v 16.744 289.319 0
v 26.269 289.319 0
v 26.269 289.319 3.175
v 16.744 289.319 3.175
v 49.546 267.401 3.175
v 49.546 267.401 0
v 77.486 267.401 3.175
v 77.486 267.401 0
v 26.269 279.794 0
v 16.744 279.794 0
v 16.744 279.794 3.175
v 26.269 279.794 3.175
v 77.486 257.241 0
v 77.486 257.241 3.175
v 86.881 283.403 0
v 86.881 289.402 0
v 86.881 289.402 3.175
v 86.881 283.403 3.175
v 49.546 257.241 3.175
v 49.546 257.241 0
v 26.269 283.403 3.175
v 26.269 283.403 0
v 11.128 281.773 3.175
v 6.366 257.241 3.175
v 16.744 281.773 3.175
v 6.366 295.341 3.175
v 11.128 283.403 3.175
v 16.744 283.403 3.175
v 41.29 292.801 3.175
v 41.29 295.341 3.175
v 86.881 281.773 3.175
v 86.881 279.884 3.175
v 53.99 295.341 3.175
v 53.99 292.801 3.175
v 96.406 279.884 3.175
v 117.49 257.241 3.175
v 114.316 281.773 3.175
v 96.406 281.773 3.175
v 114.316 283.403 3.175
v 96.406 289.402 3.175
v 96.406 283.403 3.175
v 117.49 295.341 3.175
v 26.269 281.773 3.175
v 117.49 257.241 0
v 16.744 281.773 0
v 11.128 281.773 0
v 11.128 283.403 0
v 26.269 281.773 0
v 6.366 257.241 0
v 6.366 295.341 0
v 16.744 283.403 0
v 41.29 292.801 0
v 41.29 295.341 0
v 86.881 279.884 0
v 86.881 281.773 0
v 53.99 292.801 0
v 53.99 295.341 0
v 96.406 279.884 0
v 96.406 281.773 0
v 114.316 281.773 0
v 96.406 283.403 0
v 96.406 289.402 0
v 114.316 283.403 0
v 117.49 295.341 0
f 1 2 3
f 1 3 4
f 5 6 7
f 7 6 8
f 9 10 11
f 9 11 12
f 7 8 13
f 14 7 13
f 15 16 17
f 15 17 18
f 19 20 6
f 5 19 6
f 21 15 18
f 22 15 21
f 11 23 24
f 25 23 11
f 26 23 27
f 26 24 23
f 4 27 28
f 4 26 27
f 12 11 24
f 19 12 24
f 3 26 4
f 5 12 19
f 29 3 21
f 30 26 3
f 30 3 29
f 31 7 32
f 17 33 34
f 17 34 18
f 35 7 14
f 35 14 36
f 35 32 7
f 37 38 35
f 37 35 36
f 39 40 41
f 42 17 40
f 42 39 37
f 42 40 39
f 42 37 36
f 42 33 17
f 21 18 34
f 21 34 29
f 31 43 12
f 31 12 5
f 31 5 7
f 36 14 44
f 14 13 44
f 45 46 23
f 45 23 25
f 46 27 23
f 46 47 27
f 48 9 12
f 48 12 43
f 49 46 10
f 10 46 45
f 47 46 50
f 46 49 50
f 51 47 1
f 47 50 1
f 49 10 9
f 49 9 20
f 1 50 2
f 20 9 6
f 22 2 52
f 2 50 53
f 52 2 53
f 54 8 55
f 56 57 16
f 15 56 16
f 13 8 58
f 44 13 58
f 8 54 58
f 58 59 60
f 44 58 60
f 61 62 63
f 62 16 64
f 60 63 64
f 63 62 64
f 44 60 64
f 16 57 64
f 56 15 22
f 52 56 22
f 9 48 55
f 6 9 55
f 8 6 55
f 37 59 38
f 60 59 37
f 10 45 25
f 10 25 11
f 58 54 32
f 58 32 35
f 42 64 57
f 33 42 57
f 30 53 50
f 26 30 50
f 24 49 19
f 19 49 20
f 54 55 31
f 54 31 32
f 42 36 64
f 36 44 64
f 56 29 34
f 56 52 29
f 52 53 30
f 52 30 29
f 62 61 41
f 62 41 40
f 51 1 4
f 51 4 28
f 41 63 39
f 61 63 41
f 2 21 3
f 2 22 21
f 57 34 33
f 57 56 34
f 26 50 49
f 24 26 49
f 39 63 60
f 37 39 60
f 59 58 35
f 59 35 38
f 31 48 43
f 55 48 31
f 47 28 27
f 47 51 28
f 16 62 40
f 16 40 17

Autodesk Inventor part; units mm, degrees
ref_plane "YZ Plane" through (0, 0, 0) normal (1, 0, 0) x (0, 1, 0)
ref_plane "XZ Plane" through (0, 0, 0) normal (0, 1, 0) x (-1, 0, 0)
ref_plane "XY Plane" through (0, 0, 0) normal (0, 0, 1) x (1, 0, 0)
sketch "Sketch1" plane through (0, 0, 0) normal (0, 0, 1) x (1, 0, 0)
  line L0 (117.4905, 295.341) -> (6.3655, 295.341)
  line L1 (6.3655, 295.341) -> (6.3655, 257.241)
  line L2 (6.3655, 257.241) -> (117.4905, 257.241)
  line L3 (117.4905, 257.241) -> (117.4905, 295.341)
  line L4 (117.4905, 283.403) -> (6.3655, 283.403)
  line L5 (6.3655, 283.403) -> (6.3655, 281.773)
  line L6 (6.3655, 281.773) -> (117.4905, 281.773)
  line L7 (117.4905, 281.773) -> (117.4905, 283.403)
  line L8 (117.4905, 281.773) -> (117.4905, 283.403)
  line L9 (6.3655, 283.403) -> (11.128, 283.403)
  line L10 (11.128, 283.403) -> (11.128, 281.773)
  line L11 (11.128, 281.773) -> (6.3655, 281.773)
  line L12 (6.3655, 281.773) -> (6.3655, 283.403)
  line L13 (117.4905, 283.403) -> (114.3155, 283.403)
  line L14 (114.3155, 283.403) -> (114.3155, 281.773)
  line L15 (114.3155, 281.773) -> (117.4905, 281.773)
  line L16 (117.4905, 281.773) -> (117.4905, 283.403)
  point P0 (0, 0)
  dimension "d0" = 38.1
  dimension "d1" = 111.125
  dimension "d2" = 1.63
  dimension "d3" = 11.938
  dimension "d23" = 103.1875
  dimension "d24" = 3.175
extrude "Extrusion1" add sketch "Sketch1" along normal blind 3.175 contours L3 L4 L1 L0 | L3 L6 L14 L4 | L4 L10 L6 L1 | L3 L2 L1 L6
sketch "Sketch2" plane through (0, 0, 0) normal (0, 0, -1) x (-1, 0, 0)
  line L0 (-114.3155, 283.403) -> (-11.128, 283.403) projected
  line L1 (-26.2688, 289.3188) -> (-16.7438, 289.3188)
  line L2 (-16.7438, 289.3188) -> (-16.7438, 279.7938)
  line L3 (-16.7438, 279.7938) -> (-26.2688, 279.7938)
  line L4 (-26.2688, 279.7938) -> (-26.2688, 289.3188)
  line L5 (-96.4063, 289.4015) -> (-86.8813, 289.4015)
  line L6 (-86.8813, 289.4015) -> (-86.8813, 279.8838)
  line L7 (-86.8813, 279.8838) -> (-96.4063, 279.8838)
  line L8 (-96.4063, 279.8838) -> (-96.4063, 289.4015)
  line L9 (-6.3655, 257.241) -> (-117.4905, 257.241) projected
  line L10 (-6.3655, 295.341) -> (-6.3655, 257.241) projected
  line L11 (-77.4855, 257.241) -> (-49.5455, 257.241)
  line L12 (-49.5455, 257.241) -> (-49.5455, 267.401)
  line L13 (-49.5455, 267.401) -> (-77.4855, 267.401)
  line L14 (-77.4855, 267.401) -> (-77.4855, 257.241)
  line L15 (-117.4905, 257.241) -> (-117.4905, 295.341) projected
  line L16 (-117.4905, 295.341) -> (-6.3655, 295.341) projected
  line L17 (-53.9905, 295.341) -> (-41.2905, 295.341)
  line L18 (-41.2905, 295.341) -> (-41.2905, 292.801)
  line L19 (-41.2905, 292.801) -> (-53.9905, 292.801)
  line L20 (-53.9905, 292.801) -> (-53.9905, 295.341)
  point P0 (0, 0)
  point P1 (-117.4905, 283.403)
  point P2 (-6.3655, 283.403)
  dimension "d8" = 9.525
  dimension "d9" = 9.5177
  dimension "d10" = 9.525
  dimension "d11" = 9.525
  dimension "d13" = 5.9159
  dimension "d17" = 10.16
  dimension "d18" = 27.94
  dimension "d19" = 43.18
  dimension "d20" = 2.54
  dimension "d21" = 12.7
  dimension "d22" = 63.5
extrude "Extrusion2" cut sketch "Sketch2" against normal blind 3.175 contours L8 L5 L6 L0 | L0 L6 L7 L8 | L4 L1 L2 L0 | L0 L2 L3 L4 | L9 L14 L13 L12 | L18 L19 L20 L16
properties part number "RearBulkhead"
